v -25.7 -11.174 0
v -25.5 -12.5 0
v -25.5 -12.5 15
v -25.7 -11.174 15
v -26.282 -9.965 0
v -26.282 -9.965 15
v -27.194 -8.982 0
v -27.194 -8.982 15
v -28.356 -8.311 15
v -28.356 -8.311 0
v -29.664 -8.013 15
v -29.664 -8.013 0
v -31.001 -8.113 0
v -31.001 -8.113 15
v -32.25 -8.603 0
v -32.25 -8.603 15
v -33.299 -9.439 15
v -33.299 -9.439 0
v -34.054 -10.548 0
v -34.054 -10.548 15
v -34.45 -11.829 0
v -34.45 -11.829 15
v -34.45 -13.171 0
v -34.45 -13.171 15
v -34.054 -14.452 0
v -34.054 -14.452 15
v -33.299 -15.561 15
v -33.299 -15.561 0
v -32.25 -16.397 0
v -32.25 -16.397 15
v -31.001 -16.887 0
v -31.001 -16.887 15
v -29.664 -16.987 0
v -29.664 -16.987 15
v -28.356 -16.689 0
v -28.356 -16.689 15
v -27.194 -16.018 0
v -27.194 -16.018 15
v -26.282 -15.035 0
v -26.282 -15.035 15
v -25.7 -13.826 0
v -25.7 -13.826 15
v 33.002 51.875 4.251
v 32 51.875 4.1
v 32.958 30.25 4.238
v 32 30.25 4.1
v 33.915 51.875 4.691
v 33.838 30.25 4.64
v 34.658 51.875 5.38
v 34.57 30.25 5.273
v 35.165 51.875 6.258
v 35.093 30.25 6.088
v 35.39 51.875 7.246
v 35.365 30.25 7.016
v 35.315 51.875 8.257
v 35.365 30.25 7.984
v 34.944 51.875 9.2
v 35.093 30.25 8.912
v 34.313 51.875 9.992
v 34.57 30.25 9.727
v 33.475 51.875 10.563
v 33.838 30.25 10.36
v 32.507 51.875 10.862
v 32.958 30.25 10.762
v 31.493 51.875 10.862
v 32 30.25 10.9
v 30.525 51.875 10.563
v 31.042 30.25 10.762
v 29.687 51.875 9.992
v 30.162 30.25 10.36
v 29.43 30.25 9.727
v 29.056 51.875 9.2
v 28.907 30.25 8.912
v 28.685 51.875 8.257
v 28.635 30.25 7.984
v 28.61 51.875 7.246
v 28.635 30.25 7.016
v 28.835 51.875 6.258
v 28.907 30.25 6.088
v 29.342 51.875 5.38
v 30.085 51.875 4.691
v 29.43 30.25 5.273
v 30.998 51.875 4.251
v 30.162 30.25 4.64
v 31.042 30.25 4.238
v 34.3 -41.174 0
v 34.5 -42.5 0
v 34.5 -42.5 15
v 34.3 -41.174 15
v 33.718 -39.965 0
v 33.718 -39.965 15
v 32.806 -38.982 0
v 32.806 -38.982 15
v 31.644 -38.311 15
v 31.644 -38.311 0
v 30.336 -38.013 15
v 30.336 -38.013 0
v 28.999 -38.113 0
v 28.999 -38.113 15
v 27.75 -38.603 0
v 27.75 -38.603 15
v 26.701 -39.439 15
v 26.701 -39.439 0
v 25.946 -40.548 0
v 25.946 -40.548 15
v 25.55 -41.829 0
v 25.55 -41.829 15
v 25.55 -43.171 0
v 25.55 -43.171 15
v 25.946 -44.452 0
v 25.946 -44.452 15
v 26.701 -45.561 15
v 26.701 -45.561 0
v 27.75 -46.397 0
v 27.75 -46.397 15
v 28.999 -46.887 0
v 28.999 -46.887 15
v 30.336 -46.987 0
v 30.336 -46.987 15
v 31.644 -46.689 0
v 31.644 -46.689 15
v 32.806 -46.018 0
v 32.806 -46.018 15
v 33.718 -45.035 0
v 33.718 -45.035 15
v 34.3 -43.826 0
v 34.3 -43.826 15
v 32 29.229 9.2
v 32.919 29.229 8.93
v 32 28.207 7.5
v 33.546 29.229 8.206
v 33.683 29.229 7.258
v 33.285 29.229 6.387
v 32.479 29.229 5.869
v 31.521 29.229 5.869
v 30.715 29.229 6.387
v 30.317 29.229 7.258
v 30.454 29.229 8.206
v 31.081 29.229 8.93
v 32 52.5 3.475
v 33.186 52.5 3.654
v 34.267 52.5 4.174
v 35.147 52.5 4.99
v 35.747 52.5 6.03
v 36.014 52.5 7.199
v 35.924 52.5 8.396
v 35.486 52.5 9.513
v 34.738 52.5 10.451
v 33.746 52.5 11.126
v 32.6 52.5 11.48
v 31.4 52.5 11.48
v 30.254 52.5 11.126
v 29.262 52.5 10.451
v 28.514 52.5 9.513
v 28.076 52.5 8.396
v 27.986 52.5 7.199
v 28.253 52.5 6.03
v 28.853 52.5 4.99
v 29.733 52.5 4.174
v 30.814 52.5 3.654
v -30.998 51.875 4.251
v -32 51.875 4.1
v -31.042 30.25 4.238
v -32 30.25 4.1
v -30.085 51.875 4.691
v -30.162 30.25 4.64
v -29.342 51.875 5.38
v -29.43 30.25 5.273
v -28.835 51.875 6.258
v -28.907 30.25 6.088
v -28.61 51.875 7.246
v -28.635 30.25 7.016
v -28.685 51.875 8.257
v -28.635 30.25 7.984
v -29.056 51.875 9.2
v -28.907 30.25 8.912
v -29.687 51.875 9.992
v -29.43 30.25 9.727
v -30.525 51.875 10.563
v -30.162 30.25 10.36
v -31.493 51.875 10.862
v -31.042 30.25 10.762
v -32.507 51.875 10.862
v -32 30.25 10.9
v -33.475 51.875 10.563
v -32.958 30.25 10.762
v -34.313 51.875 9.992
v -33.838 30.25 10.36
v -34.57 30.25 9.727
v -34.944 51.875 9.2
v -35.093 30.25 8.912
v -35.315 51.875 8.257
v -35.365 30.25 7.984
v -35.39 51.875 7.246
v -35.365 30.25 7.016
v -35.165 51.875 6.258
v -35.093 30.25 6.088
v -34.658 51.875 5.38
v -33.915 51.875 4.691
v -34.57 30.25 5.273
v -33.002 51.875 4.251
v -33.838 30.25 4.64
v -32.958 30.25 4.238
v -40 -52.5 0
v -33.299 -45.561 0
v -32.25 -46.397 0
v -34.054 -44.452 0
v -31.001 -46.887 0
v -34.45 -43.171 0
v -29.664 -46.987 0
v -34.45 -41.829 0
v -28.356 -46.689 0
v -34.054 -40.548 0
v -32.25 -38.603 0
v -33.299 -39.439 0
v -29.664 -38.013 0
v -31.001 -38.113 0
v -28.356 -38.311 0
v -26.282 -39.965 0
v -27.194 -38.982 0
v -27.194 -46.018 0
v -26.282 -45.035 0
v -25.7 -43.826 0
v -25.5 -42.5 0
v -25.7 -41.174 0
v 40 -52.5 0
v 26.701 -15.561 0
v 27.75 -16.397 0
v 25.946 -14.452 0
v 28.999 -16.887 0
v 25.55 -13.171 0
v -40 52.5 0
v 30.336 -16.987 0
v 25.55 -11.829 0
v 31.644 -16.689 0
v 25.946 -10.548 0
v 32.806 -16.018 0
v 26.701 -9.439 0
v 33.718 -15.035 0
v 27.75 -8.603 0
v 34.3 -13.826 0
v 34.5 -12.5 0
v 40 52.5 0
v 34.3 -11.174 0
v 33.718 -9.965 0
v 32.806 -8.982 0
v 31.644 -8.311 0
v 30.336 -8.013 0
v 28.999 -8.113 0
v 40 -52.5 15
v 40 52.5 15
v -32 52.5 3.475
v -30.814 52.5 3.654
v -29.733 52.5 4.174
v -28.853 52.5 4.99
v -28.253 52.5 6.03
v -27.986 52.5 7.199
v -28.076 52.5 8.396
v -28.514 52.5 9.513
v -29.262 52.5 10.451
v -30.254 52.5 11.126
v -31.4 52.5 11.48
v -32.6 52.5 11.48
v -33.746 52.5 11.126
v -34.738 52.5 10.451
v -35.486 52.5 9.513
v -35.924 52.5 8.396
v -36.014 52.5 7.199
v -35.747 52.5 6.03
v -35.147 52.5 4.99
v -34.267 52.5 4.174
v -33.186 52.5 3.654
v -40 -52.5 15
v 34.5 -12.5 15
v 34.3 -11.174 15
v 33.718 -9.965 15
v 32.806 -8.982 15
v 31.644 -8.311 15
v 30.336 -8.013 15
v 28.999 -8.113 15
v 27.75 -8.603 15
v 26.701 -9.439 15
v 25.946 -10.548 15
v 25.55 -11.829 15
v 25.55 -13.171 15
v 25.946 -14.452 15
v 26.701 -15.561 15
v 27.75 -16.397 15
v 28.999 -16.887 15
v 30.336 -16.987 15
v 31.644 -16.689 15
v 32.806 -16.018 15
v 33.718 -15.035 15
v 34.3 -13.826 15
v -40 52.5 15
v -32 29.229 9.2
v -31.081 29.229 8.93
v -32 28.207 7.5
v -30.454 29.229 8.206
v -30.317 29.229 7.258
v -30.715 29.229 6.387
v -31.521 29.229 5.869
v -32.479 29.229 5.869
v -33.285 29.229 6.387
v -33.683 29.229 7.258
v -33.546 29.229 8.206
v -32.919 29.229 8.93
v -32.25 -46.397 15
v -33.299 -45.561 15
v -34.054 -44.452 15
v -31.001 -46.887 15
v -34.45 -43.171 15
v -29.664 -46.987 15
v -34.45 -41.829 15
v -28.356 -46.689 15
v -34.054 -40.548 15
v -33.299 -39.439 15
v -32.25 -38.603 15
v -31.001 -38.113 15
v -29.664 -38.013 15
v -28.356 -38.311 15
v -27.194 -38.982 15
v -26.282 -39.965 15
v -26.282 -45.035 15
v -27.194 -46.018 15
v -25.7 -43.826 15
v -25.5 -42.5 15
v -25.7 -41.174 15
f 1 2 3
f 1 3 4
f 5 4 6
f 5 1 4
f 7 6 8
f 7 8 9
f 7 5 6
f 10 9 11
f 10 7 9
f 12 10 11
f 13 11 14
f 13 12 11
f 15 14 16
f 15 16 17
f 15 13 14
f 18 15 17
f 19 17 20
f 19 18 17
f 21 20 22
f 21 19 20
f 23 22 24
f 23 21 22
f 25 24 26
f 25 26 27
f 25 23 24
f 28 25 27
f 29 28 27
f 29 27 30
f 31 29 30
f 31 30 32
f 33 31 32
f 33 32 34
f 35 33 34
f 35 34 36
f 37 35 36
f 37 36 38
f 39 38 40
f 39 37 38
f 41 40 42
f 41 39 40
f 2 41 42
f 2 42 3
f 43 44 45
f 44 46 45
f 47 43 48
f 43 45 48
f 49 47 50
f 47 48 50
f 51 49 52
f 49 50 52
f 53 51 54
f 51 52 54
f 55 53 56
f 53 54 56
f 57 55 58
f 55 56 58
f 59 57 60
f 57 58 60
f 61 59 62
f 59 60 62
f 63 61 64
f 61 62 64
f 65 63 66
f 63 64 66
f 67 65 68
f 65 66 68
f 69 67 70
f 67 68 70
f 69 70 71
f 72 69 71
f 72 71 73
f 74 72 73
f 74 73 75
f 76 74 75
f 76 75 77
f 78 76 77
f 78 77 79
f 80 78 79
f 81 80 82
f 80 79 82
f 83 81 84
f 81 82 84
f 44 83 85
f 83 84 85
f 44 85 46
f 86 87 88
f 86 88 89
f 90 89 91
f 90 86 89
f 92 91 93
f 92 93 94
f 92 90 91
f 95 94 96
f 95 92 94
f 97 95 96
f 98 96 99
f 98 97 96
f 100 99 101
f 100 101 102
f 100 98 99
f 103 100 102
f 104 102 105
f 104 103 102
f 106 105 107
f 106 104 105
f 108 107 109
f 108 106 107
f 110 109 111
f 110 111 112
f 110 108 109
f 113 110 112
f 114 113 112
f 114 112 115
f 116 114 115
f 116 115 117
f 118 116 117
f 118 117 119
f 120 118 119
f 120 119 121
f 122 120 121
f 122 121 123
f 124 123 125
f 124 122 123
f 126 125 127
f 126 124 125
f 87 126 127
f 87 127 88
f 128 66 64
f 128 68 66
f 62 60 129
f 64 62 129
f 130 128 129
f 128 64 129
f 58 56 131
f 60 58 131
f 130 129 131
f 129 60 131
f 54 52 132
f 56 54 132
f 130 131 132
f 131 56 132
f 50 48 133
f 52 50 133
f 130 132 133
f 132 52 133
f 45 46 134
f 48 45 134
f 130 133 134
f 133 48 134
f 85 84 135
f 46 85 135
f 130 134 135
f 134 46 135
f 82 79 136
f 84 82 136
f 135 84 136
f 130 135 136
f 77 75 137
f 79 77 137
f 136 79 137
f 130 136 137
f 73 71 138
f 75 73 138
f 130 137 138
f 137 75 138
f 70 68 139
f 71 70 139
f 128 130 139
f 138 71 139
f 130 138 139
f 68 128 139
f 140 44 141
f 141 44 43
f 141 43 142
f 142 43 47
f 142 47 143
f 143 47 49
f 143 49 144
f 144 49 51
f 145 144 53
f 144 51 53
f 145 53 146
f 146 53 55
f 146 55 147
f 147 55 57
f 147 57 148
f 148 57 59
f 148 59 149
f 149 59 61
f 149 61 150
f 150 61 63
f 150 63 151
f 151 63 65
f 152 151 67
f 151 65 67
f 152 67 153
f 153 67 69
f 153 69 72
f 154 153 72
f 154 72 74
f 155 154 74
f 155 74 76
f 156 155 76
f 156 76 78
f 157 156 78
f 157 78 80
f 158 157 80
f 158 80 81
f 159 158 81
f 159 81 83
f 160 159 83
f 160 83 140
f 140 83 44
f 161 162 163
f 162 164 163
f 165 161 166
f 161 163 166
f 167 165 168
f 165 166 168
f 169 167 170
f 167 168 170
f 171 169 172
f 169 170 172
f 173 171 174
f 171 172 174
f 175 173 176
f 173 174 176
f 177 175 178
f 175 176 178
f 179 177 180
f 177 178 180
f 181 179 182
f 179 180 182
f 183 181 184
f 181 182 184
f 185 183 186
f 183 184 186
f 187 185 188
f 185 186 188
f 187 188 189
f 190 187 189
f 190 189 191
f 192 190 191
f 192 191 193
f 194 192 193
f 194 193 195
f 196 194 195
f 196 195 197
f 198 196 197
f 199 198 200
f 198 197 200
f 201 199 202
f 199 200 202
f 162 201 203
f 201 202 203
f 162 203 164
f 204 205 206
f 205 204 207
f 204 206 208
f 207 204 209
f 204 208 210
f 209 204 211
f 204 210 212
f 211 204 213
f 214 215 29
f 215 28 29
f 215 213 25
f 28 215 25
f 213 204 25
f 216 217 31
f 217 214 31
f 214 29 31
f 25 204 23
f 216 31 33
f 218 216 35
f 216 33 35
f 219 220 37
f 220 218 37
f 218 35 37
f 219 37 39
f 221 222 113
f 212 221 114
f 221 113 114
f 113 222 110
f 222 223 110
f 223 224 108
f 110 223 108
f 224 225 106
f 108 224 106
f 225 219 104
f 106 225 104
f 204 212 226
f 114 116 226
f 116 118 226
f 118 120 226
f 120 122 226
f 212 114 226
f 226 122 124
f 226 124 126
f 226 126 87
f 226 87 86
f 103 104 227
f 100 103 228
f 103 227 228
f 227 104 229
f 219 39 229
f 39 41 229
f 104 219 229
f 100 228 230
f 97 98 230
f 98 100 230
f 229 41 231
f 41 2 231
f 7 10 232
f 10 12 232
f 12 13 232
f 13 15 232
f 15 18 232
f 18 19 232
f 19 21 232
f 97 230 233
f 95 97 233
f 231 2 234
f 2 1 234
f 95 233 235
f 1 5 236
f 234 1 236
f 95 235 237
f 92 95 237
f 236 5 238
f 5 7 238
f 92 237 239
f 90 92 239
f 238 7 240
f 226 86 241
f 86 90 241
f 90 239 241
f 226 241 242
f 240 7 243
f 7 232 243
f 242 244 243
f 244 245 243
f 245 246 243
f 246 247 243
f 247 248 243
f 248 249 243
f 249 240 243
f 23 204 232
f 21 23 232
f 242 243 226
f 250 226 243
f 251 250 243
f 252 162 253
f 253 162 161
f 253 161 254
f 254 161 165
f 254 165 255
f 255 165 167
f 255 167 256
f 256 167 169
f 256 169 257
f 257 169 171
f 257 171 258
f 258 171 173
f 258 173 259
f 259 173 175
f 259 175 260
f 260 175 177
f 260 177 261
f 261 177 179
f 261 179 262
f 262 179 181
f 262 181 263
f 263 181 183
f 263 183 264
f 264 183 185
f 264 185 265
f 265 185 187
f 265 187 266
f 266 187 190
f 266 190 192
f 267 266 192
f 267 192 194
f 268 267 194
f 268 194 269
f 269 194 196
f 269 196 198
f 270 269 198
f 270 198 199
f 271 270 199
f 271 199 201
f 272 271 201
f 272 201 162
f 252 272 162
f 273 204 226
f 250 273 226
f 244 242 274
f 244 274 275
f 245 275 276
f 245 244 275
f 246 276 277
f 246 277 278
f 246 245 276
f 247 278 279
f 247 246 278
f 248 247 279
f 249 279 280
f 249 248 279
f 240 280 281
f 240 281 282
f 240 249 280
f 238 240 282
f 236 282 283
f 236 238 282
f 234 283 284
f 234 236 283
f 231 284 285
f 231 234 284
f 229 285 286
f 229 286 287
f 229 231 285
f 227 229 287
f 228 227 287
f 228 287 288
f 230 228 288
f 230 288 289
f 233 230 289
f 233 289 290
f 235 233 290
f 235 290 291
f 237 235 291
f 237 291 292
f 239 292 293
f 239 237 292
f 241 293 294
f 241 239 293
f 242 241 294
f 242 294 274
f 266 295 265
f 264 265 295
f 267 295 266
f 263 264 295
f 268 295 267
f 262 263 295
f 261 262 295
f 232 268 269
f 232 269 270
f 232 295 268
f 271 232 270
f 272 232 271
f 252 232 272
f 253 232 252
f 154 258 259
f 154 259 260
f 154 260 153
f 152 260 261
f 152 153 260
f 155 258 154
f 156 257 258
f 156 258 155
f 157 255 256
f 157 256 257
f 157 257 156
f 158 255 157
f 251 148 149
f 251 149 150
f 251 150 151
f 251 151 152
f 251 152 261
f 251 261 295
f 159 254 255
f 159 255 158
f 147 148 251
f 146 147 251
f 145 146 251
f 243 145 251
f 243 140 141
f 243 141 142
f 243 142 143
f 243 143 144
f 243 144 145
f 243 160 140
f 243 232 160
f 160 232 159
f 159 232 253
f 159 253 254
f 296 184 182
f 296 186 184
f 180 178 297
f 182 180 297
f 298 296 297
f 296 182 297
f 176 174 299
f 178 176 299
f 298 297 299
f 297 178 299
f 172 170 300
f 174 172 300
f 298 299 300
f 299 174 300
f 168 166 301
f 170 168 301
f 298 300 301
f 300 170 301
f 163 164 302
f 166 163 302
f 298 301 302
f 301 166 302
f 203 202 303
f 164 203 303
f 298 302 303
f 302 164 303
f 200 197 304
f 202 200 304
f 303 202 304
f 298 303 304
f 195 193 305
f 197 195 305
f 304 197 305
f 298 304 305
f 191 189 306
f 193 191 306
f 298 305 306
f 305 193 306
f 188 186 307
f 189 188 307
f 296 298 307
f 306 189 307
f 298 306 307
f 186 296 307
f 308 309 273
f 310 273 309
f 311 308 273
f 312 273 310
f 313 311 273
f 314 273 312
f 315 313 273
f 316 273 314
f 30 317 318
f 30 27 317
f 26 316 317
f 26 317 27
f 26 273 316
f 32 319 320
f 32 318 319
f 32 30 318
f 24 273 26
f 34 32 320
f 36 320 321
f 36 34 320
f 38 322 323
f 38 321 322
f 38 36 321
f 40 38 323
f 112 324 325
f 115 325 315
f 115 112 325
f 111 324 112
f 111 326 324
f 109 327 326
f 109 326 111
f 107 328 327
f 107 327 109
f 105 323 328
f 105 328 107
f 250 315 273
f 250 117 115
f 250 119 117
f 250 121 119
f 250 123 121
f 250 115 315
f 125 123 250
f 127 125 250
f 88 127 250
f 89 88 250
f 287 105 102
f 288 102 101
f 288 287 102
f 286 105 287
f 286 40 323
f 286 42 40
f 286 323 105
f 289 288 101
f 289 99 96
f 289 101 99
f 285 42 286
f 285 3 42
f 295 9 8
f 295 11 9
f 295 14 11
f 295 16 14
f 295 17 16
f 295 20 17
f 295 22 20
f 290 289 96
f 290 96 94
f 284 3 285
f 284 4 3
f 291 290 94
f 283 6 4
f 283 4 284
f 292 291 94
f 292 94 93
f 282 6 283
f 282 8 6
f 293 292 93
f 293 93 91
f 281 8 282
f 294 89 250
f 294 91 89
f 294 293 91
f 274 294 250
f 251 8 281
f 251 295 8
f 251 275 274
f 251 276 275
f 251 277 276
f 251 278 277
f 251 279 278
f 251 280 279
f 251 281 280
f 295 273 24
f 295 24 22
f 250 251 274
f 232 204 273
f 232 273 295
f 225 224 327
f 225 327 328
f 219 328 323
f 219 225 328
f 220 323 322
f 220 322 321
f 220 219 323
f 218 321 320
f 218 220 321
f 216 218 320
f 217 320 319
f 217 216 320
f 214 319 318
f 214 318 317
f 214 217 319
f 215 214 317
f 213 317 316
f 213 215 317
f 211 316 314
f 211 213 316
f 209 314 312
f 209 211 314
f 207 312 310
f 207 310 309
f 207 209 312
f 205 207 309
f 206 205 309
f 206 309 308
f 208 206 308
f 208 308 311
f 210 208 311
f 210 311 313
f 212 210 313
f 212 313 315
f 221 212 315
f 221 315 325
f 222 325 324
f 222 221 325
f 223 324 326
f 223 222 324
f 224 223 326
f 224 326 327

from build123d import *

# Parameters (mm, degrees)
SKETCH_1_W                   = 80
SKETCH_1_H                   = 105
SKETCH_1_R                   = 4.5
EXTRUDE_1_DEPTH              = 15
HOLE_WIZARD_M8_1_D           = 6.8
HOLE_WIZARD_M8_1_DEPTH       = 22.25
HOLE_WIZARD_M8_1_CSINK_D     = 8.05
HOLE_WIZARD_M8_1_CSINK_ANGLE = 90
HOLE_WIZARD_M8_1_TIP         = 2.042926105


with BuildPart() as part:
    # 草图1 → 凸台-拉伸1 (new body)
    with BuildSketch(Plane.XY):
        Rectangle(SKETCH_1_W, SKETCH_1_H)
        with Locations((-30, -12.5)):
            Circle(SKETCH_1_R, mode=Mode.SUBTRACT)
        with Locations((30, -12.5)):
            Circle(SKETCH_1_R, mode=Mode.SUBTRACT)
        with Locations((30, -42.5)):
            Circle(SKETCH_1_R, mode=Mode.SUBTRACT)
        with Locations((-30, -42.5)):
            Circle(SKETCH_1_R, mode=Mode.SUBTRACT)
    extrude(amount=EXTRUDE_1_DEPTH)

    # M8 螺纹孔1
    with Locations(Plane(origin=(-32, 52.5, 7.5), x_dir=(0, 0, 1), z_dir=(0, 1, 0))):
        with Locations((0, 0), (0, 64)):
            CounterSinkHole(HOLE_WIZARD_M8_1_D / 2, HOLE_WIZARD_M8_1_CSINK_D / 2, depth=HOLE_WIZARD_M8_1_DEPTH, counter_sink_angle=HOLE_WIZARD_M8_1_CSINK_ANGLE)
            with Locations((0, 0, -(HOLE_WIZARD_M8_1_DEPTH + HOLE_WIZARD_M8_1_TIP / 2))):  # 118° drill point
                Cone(0, HOLE_WIZARD_M8_1_D / 2, HOLE_WIZARD_M8_1_TIP, mode=Mode.SUBTRACT)


solid = part.part
